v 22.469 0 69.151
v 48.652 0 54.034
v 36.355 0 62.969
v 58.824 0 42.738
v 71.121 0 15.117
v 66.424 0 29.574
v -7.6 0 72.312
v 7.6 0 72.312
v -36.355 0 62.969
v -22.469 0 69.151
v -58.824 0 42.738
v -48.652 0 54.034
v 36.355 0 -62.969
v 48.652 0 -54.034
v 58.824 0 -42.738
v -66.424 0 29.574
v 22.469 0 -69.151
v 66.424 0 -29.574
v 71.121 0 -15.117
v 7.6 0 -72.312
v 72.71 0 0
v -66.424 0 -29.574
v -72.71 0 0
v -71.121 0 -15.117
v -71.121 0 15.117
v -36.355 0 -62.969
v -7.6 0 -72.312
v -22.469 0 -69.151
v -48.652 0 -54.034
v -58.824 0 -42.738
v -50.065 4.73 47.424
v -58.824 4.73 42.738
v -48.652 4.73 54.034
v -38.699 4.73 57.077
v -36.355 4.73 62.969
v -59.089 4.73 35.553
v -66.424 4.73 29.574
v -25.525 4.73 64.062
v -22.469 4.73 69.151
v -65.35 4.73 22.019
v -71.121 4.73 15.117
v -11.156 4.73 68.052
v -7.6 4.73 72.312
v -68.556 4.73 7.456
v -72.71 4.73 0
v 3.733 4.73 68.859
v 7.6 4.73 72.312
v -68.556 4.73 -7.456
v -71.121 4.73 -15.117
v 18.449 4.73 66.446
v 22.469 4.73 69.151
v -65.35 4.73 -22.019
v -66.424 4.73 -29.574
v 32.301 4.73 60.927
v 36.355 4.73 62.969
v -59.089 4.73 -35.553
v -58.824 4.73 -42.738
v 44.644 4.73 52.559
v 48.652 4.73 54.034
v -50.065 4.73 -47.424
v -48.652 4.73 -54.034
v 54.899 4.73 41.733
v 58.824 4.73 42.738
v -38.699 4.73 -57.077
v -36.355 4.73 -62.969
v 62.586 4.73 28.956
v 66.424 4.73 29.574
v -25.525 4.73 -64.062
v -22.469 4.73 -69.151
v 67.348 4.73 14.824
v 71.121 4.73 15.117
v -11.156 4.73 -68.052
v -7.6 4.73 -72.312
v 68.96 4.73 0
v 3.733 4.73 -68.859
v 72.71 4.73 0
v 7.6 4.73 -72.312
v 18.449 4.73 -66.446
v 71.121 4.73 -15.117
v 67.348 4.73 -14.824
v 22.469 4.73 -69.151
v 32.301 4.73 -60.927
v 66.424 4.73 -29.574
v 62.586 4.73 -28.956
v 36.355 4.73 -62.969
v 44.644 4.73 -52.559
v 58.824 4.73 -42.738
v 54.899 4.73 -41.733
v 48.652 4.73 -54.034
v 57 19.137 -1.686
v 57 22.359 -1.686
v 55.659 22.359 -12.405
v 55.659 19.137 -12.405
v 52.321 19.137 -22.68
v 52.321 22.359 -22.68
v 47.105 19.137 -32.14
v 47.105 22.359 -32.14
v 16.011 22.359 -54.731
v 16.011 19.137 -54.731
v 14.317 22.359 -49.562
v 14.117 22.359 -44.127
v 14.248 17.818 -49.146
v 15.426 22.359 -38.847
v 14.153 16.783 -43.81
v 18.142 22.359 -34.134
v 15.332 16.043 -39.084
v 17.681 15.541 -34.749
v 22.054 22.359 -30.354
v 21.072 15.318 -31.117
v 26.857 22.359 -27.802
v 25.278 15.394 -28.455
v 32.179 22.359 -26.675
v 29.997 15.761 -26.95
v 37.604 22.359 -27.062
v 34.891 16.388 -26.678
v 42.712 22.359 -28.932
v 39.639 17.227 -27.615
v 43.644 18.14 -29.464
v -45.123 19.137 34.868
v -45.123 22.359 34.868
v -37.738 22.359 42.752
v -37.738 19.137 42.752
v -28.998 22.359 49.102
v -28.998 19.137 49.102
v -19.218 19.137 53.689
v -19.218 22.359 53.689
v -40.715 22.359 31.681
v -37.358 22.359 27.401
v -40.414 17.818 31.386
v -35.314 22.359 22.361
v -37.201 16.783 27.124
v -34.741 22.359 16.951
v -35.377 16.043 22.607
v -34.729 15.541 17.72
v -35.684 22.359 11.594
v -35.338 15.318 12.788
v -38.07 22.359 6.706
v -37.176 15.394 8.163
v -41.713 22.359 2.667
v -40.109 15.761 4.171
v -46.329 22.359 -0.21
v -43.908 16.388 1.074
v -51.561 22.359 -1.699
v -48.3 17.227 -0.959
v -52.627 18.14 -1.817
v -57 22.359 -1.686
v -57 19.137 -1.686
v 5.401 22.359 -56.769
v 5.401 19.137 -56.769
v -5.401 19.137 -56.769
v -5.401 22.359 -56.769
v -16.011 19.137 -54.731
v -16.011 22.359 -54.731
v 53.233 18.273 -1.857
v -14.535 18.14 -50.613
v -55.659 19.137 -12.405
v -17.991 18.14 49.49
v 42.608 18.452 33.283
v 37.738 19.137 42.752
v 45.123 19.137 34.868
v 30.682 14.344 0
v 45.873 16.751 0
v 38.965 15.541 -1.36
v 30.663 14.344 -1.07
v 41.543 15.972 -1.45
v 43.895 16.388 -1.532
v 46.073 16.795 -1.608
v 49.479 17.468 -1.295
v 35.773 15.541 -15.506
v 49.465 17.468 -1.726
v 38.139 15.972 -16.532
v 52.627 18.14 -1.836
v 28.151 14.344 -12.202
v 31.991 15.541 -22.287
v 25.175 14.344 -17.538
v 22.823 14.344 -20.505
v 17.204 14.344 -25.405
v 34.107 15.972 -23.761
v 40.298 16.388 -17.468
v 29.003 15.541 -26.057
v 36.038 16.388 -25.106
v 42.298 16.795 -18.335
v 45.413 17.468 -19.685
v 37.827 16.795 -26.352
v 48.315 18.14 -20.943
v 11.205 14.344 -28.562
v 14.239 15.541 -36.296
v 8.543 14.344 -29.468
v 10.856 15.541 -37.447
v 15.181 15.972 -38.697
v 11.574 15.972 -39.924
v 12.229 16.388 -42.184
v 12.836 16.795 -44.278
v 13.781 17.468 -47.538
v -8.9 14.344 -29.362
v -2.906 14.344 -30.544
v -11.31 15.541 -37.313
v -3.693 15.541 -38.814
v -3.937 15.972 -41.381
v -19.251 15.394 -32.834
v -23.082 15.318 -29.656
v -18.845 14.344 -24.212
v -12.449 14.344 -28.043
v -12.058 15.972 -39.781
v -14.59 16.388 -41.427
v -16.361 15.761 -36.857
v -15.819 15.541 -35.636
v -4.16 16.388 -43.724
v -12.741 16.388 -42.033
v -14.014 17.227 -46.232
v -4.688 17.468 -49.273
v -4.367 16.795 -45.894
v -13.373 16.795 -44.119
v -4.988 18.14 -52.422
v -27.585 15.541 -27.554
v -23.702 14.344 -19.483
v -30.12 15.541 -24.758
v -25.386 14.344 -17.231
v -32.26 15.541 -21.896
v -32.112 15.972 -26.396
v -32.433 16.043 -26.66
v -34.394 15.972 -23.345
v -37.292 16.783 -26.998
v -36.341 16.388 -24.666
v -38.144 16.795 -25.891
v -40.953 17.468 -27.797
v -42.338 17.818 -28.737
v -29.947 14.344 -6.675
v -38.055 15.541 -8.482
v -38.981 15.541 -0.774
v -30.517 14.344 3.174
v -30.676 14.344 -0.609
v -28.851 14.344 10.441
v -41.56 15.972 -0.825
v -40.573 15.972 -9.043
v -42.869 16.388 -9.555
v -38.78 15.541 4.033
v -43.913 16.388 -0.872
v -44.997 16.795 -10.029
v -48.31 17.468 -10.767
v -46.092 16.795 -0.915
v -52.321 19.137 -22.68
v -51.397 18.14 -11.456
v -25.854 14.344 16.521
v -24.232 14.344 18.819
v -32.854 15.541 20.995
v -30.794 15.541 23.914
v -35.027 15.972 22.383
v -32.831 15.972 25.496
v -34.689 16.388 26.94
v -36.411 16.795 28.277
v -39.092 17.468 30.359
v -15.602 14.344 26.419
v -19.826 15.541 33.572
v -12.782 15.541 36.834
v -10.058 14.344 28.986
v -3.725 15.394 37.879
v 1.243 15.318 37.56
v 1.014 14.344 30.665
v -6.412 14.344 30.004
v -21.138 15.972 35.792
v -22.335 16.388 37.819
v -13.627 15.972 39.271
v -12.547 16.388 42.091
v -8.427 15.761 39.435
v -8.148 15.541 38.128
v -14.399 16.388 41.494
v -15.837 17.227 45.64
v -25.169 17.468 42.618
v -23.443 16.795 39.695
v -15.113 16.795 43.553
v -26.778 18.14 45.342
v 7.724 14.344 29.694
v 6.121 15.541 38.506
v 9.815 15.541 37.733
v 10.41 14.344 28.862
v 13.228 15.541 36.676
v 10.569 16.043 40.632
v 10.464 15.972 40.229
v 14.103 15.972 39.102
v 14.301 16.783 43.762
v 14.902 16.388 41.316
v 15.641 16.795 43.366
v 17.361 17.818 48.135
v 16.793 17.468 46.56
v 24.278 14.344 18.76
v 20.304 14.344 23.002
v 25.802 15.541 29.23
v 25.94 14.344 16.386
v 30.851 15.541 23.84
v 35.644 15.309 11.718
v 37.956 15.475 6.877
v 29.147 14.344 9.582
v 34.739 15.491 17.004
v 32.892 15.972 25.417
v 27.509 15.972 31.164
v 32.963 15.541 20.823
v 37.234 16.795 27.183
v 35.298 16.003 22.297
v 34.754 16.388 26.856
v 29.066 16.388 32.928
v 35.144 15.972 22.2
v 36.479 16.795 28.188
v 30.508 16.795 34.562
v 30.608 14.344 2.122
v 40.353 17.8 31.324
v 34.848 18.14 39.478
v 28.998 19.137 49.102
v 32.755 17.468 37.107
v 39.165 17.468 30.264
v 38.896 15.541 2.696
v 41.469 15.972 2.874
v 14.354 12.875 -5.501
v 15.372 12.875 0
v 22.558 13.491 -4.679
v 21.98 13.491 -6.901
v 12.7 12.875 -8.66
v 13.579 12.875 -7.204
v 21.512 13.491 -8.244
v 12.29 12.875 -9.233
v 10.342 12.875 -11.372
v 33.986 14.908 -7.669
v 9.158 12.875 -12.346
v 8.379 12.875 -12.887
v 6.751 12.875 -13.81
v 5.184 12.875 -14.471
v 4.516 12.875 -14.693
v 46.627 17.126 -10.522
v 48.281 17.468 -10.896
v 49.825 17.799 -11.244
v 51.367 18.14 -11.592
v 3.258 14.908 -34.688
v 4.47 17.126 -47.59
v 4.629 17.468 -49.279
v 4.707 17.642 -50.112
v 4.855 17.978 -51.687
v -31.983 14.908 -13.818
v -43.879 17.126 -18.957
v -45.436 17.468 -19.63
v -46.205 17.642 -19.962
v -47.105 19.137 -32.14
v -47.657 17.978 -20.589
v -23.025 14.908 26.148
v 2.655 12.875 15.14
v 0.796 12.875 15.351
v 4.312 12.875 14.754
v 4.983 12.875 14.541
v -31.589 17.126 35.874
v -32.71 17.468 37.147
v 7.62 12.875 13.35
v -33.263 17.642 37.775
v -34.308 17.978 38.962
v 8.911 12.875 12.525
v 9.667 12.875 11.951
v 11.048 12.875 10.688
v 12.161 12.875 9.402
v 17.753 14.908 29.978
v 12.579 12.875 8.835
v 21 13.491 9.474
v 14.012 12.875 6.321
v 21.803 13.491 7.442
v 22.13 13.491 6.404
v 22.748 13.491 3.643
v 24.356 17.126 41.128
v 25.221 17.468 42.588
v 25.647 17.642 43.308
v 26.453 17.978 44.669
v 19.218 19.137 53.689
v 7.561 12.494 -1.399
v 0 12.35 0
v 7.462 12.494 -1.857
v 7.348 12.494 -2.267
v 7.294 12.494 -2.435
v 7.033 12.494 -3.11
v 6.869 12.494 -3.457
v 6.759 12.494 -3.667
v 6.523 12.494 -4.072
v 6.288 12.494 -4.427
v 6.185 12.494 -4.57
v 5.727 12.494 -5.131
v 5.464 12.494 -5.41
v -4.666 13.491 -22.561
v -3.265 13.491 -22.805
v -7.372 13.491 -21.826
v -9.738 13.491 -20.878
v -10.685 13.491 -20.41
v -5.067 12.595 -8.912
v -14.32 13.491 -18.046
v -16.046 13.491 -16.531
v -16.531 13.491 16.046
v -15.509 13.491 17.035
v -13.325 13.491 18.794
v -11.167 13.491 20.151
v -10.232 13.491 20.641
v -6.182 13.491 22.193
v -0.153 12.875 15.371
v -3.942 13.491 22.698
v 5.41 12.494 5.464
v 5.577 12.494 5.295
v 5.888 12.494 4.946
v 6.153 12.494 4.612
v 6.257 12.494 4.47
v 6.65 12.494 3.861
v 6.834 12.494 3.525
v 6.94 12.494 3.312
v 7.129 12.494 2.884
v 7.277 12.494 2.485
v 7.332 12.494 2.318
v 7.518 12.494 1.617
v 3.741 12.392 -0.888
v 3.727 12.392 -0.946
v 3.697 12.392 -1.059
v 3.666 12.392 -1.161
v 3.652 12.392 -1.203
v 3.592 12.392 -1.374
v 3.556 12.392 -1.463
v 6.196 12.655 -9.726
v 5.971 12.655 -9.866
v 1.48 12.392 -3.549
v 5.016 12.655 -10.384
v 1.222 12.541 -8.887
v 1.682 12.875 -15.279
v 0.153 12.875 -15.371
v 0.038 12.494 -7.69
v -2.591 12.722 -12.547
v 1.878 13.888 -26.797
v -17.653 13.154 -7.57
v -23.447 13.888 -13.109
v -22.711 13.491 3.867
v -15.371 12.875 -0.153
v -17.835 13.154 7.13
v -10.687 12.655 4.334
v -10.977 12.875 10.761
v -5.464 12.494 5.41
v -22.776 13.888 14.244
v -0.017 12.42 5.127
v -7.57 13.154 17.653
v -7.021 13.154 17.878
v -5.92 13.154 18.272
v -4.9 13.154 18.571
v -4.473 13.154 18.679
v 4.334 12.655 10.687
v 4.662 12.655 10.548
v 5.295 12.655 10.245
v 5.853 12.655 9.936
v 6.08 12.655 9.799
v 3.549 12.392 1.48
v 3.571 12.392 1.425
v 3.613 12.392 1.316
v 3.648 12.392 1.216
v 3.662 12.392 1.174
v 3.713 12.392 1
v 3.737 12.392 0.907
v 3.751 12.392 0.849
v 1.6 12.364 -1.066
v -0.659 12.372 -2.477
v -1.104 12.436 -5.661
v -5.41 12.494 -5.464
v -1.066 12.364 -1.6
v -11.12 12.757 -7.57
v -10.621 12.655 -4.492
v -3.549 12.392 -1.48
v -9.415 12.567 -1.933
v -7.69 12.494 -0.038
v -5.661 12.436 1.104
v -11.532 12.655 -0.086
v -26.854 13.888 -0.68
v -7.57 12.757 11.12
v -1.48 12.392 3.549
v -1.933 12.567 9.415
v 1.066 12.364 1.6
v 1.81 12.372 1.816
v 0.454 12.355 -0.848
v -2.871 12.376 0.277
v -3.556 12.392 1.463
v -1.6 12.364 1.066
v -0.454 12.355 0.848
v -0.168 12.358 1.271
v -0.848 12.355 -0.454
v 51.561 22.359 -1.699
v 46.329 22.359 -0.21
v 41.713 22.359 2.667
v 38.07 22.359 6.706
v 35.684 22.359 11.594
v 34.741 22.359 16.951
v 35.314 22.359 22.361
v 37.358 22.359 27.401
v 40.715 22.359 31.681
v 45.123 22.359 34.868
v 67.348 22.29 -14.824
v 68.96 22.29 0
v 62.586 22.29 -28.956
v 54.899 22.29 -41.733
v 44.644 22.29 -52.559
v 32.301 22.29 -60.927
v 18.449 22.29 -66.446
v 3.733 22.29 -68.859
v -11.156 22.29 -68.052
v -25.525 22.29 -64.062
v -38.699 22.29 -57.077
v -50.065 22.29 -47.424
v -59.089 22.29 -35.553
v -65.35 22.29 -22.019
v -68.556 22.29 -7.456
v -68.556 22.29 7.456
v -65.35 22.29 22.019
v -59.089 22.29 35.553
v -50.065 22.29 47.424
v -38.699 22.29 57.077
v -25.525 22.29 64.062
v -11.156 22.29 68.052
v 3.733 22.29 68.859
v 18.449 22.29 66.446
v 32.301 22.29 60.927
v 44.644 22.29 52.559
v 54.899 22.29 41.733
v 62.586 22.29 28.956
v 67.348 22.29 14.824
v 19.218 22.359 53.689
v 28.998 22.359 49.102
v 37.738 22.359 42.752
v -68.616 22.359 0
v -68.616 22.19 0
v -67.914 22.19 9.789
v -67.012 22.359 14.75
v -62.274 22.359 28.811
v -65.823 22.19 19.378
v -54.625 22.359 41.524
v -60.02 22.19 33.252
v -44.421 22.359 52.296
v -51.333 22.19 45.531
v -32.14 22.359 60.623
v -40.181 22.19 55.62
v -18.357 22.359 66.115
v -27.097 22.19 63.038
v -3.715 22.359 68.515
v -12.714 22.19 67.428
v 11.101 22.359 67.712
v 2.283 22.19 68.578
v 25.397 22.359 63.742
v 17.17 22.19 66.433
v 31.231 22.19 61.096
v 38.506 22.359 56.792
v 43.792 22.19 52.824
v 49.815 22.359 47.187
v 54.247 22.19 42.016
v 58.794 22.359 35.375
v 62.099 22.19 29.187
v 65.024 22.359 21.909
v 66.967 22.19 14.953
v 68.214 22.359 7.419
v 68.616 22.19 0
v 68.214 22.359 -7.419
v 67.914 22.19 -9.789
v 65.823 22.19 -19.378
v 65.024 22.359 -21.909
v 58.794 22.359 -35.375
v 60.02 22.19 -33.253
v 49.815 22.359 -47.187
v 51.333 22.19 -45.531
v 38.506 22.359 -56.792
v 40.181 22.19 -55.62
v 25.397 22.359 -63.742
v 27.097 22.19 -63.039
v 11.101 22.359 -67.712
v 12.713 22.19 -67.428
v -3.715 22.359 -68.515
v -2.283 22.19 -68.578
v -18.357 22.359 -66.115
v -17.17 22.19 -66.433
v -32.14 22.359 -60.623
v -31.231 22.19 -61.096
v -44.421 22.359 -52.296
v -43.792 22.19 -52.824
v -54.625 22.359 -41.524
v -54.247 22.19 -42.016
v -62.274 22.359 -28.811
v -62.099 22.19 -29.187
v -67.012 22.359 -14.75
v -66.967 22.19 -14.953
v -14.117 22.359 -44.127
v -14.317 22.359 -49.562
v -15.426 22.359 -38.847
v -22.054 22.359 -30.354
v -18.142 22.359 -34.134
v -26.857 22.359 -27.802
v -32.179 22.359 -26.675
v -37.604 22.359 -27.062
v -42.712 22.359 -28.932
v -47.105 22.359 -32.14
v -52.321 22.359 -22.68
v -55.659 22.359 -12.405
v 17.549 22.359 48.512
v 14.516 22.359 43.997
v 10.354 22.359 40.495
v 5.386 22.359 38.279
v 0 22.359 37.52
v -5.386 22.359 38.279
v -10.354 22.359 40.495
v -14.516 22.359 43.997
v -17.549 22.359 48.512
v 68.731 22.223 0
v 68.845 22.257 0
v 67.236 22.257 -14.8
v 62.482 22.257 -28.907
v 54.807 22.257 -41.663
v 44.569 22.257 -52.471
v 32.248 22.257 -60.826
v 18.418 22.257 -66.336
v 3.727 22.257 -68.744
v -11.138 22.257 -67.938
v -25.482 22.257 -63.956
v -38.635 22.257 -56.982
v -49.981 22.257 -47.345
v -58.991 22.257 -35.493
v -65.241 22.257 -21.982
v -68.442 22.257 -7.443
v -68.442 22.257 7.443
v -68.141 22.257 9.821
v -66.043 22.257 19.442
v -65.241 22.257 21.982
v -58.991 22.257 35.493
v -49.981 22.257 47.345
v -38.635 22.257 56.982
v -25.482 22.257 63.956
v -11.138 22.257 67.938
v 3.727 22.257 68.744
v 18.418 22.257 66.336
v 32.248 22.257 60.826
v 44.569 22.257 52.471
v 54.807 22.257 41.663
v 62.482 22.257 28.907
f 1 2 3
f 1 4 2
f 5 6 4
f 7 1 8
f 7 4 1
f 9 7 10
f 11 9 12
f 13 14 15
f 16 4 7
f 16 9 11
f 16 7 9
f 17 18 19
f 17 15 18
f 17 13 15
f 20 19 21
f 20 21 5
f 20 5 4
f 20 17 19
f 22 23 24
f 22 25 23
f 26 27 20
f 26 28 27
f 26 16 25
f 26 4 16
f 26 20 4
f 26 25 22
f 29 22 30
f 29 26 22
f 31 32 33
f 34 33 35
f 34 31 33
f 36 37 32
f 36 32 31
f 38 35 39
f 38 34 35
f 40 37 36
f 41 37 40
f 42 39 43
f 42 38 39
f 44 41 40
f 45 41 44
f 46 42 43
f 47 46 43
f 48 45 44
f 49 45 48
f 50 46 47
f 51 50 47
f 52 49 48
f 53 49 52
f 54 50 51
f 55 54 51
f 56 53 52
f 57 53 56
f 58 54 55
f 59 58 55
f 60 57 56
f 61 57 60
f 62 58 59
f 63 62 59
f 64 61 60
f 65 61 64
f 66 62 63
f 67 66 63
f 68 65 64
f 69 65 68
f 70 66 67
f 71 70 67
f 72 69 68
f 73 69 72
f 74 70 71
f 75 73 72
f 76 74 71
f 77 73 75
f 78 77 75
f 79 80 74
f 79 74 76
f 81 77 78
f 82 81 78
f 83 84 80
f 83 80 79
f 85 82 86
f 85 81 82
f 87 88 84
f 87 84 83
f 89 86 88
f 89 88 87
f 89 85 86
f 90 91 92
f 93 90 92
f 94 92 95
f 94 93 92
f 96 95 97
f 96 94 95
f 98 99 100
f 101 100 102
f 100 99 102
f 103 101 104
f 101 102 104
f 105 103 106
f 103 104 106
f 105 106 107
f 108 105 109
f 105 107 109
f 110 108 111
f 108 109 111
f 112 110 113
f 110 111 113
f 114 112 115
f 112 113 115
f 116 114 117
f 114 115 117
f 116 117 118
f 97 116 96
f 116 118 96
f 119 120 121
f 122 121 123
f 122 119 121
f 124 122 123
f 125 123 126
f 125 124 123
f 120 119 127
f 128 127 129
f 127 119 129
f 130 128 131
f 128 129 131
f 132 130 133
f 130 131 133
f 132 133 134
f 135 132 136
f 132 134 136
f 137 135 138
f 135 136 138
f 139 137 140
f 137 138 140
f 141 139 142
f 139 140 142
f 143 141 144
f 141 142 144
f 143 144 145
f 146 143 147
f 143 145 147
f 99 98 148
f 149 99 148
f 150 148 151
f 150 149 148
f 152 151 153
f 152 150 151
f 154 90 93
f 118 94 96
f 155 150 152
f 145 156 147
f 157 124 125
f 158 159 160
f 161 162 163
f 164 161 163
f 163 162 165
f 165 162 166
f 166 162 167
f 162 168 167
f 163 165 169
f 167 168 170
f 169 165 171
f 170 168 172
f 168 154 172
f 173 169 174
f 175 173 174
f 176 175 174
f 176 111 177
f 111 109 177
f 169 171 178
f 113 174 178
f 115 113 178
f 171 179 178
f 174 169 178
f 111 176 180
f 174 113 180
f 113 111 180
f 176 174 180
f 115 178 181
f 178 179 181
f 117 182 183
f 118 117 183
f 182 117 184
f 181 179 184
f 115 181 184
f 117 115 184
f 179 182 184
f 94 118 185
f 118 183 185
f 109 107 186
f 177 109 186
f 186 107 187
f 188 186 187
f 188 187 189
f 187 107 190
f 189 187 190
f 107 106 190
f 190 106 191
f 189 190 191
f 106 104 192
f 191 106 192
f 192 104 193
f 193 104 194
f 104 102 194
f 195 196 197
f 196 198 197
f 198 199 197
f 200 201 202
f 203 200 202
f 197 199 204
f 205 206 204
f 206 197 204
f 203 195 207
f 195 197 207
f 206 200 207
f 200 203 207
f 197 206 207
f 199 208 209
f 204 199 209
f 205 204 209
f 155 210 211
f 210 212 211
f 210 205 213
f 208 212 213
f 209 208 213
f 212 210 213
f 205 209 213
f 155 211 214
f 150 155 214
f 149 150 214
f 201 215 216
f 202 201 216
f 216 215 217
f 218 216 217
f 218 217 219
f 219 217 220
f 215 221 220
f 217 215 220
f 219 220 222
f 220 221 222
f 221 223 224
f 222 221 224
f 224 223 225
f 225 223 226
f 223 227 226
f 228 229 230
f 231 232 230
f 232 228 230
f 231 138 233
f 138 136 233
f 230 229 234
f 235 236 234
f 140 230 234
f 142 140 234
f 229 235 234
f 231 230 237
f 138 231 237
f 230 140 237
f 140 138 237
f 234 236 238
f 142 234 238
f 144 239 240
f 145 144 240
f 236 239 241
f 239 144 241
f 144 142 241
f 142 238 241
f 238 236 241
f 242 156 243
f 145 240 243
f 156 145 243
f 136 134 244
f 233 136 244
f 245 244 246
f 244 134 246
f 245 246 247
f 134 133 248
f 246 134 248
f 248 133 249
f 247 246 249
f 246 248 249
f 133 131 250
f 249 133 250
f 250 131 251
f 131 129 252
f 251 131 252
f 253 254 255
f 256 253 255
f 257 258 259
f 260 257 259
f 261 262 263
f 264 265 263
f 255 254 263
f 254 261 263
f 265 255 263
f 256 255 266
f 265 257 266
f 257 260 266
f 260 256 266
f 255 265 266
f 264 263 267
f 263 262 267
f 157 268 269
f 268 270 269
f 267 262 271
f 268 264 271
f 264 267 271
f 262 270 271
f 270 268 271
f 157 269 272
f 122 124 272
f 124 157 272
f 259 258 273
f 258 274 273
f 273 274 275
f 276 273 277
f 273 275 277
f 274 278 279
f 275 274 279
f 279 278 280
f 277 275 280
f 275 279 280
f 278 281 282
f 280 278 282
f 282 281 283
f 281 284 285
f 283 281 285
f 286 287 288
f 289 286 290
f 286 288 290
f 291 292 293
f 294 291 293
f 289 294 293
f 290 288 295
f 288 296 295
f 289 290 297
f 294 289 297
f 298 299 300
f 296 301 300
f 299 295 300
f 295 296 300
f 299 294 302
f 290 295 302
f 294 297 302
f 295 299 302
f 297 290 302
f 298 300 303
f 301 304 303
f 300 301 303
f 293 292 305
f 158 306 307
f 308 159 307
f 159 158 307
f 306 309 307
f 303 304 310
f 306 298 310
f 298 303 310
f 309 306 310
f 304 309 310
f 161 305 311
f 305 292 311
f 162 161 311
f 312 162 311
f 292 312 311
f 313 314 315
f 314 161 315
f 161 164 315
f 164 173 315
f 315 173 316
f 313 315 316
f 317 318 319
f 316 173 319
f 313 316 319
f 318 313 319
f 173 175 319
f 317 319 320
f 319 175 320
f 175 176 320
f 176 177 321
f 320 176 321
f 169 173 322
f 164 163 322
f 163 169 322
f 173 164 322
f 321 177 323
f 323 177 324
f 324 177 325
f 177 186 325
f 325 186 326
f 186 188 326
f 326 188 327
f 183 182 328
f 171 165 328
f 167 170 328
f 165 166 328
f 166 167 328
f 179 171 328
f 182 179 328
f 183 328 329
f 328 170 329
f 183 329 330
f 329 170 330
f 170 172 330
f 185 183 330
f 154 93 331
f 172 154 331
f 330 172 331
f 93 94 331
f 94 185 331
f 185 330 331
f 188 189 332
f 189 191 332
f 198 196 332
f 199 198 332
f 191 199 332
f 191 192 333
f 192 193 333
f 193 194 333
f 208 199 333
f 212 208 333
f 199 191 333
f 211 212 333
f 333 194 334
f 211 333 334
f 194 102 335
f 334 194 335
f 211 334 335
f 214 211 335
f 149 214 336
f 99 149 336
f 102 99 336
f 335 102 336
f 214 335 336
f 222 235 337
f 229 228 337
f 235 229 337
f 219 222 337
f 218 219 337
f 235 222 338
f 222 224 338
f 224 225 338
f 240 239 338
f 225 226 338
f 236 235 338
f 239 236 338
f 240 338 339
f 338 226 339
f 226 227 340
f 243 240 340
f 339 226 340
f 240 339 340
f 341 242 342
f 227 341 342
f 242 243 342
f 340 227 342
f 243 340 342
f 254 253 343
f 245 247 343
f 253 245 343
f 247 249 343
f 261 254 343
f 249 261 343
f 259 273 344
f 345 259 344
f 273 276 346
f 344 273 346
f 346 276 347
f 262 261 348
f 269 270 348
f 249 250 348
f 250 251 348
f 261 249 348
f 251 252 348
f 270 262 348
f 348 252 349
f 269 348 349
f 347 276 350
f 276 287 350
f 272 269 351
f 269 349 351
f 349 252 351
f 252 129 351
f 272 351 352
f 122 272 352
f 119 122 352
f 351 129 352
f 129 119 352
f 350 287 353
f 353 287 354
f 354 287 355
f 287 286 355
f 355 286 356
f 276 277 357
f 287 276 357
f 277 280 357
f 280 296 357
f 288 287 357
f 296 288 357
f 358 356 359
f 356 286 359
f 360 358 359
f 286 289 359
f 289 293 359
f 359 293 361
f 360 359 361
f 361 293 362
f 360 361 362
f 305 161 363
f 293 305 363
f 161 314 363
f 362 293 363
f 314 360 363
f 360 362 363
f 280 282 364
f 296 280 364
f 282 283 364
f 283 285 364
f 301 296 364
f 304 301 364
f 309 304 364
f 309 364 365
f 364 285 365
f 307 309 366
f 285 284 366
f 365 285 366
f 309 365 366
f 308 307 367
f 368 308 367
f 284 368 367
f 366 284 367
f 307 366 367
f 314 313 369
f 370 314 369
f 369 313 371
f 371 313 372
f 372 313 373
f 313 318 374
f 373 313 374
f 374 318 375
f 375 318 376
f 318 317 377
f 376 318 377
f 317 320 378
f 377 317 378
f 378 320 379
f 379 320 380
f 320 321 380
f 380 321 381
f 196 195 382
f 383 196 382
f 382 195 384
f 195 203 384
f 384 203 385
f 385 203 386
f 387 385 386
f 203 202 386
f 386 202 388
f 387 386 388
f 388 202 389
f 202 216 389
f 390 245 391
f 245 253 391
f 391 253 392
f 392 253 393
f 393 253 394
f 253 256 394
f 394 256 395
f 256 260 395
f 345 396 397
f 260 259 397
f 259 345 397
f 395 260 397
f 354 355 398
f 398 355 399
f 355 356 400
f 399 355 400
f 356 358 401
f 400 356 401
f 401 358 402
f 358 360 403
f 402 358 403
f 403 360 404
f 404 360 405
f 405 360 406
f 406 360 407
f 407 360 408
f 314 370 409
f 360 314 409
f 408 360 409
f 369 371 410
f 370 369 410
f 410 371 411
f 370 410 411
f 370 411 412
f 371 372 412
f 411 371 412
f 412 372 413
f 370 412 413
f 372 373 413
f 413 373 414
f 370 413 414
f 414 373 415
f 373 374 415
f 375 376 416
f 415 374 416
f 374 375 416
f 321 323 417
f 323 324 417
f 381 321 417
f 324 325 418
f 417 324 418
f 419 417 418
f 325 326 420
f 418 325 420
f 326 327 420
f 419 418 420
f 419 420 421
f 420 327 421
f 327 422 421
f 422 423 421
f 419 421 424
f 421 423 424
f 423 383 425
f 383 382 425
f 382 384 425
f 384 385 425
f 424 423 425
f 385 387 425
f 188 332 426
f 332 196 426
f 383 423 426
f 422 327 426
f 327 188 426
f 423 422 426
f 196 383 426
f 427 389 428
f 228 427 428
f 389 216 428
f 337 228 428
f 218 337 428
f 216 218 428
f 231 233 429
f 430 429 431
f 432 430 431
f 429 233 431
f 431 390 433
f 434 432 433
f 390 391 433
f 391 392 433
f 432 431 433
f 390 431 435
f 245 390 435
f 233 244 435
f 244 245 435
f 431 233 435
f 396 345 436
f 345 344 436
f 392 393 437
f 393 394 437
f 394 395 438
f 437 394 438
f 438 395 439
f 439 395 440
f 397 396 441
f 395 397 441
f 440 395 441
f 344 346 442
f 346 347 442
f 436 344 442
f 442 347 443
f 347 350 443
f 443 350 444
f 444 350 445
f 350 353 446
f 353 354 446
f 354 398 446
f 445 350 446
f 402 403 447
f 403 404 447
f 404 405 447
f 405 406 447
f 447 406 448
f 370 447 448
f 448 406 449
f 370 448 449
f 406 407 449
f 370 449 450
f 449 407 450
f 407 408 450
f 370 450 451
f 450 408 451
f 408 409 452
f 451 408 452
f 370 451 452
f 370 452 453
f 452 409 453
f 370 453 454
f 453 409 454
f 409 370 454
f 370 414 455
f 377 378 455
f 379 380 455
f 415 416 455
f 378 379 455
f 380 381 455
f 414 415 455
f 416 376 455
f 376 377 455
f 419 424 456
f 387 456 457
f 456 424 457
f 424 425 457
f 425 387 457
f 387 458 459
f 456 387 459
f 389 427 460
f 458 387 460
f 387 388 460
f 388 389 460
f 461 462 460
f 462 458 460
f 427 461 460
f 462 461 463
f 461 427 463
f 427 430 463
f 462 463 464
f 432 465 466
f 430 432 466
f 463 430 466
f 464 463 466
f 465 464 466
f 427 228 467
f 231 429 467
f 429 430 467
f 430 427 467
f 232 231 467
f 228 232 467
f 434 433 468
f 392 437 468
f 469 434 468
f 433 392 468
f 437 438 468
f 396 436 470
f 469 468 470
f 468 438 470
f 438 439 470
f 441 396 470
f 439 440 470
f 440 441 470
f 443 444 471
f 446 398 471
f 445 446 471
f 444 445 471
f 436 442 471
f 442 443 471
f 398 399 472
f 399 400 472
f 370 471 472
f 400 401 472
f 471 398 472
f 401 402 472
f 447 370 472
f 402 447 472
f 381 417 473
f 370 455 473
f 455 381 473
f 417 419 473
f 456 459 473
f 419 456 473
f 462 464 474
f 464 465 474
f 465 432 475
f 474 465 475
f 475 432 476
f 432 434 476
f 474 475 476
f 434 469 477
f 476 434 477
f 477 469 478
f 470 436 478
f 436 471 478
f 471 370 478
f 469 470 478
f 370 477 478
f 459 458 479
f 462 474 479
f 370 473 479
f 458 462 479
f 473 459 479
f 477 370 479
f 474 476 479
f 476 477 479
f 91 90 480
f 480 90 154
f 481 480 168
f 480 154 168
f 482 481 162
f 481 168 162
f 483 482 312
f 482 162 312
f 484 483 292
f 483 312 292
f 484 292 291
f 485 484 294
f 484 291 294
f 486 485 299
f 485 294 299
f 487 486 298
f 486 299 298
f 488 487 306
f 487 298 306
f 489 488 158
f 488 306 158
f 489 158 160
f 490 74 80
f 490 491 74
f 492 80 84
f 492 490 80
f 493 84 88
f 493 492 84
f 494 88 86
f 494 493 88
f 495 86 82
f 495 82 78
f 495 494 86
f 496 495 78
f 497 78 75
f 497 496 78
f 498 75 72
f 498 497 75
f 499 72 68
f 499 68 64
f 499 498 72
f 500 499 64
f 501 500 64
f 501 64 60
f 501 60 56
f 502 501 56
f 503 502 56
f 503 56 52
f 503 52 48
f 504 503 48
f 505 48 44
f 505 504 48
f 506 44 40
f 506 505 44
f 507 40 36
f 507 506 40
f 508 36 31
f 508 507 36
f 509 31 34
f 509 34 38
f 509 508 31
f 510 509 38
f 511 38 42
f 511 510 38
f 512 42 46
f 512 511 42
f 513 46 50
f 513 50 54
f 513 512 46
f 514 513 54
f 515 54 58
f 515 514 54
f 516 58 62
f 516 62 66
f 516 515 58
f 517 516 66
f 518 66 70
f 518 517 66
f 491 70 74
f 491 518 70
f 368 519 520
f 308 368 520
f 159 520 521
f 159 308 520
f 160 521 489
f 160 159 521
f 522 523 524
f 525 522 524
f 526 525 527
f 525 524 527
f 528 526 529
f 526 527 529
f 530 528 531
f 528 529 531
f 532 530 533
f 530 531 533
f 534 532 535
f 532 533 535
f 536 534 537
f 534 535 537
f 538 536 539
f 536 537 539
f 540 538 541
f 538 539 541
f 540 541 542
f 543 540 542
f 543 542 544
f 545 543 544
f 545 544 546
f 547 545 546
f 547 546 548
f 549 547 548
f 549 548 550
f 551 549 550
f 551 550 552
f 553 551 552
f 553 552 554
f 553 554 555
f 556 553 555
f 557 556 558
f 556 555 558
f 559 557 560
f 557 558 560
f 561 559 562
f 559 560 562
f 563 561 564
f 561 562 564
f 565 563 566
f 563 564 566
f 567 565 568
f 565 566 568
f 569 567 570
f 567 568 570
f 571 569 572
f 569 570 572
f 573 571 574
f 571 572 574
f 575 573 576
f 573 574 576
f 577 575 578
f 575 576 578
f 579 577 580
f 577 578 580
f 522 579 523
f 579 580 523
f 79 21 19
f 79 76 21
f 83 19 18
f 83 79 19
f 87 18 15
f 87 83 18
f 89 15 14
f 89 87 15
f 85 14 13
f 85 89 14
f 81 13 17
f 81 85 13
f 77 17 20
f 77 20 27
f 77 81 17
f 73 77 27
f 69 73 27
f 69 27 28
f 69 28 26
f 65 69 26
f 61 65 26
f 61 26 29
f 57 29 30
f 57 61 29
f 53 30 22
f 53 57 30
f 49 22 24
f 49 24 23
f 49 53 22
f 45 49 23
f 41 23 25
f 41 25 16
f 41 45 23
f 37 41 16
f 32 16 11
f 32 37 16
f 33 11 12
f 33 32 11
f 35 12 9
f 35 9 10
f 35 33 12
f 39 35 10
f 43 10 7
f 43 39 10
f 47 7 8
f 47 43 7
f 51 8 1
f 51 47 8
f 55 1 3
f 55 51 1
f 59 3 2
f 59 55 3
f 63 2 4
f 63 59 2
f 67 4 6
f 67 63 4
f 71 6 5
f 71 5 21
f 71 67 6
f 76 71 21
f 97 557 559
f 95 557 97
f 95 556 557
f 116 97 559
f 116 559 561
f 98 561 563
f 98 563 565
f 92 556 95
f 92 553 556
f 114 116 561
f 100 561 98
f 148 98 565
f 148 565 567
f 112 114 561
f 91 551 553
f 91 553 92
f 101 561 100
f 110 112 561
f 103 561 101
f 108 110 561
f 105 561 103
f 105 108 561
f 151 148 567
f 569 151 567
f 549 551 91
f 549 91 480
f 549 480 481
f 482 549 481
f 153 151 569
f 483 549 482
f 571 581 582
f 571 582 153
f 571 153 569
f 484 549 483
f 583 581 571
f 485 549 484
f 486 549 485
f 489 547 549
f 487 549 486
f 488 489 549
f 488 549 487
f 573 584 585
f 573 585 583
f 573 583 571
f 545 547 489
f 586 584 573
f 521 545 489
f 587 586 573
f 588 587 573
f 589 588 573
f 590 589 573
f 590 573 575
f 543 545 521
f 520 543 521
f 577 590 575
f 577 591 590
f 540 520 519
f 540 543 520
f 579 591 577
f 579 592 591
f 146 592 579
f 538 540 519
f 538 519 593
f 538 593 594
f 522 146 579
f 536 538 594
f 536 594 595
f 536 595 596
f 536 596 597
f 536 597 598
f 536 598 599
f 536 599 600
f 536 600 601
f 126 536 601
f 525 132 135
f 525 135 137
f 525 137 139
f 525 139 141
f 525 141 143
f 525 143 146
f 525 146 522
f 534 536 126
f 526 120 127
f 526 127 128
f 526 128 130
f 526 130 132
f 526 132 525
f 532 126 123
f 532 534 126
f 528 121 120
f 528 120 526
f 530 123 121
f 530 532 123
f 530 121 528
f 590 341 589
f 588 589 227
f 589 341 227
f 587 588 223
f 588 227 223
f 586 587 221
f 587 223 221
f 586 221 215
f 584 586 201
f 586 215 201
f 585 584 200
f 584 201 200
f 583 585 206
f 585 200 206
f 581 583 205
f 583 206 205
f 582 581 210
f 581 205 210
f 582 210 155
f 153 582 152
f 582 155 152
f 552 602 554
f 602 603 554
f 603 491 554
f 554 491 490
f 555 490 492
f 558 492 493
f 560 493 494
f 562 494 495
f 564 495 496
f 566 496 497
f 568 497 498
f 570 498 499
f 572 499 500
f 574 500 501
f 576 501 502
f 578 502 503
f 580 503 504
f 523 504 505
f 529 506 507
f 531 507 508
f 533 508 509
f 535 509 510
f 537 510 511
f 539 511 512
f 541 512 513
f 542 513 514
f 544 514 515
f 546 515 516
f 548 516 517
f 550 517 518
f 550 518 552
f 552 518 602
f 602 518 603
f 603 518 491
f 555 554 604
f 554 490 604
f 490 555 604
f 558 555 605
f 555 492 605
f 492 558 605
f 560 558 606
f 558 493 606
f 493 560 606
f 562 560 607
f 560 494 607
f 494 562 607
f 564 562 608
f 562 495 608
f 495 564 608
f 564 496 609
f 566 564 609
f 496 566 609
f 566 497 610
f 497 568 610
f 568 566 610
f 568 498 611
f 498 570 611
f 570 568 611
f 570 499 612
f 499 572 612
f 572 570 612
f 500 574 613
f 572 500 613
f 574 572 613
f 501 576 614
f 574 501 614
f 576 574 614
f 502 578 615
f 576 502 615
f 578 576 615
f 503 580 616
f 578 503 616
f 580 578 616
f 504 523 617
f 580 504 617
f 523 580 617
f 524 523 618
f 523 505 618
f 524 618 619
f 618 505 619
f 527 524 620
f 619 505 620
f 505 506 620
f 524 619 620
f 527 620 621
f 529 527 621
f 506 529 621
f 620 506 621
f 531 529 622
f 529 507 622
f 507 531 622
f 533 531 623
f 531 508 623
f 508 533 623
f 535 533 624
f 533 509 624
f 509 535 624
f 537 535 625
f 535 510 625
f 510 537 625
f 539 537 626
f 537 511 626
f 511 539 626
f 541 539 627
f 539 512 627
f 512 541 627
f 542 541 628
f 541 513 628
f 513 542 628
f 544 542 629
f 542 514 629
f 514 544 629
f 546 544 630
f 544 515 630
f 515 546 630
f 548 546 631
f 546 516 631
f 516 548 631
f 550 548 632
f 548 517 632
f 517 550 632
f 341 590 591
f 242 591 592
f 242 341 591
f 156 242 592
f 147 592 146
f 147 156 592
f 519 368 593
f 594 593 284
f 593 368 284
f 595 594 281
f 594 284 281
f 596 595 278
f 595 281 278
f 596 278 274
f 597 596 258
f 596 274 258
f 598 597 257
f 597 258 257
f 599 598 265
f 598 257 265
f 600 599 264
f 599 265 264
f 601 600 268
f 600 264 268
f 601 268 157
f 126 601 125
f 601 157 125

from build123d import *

# Parameters (mm, degrees)
SKETCH001_R = 68.61574
PAD_DEPTH   = 18


with BuildPart() as part:
    # Sketch → Revolution (revolve)
    with BuildSketch(Plane.XY):
        with BuildLine():
            Line((0, 0), (68.71, 0))
            Line((68.71, 0), (72.71, 0))
            Line((72.71, 0), (72.71, 4.73))
            Line((72.71, 4.73), (68.96, 4.73))
            Line((68.96, 4.73), (68.96, 22.29))
            ThreePointArc((0, 12.35), (34.827971, 14.905909), (68.96, 22.29))
            Line((0, 12.35), (0, 0))
        make_face()
    revolve(axis=Axis((0, 0, 0), (0, 1, 0)))

    # Sketch001 (on DatumPlane) → Pad (new body)
    with BuildSketch(Plane(origin=(0, 4.358878, 0), x_dir=(-1, 0, 0), z_dir=(0, 1, 0))):
        Circle(SKETCH001_R)
        with BuildLine():
            ThreePointArc((45.123091, 34.867908), (33.518525, 46.134291), (19.217549, 53.689385))
            ThreePointArc((-19.217549, 53.689385), (0, 37.520215), (19.217549, 53.689385))
            ThreePointArc((-19.217549, 53.689385), (-33.518525, 46.134291), (-45.123091, 34.867908))
            ThreePointArc((-57.000189, -1.686043), (-35.683845, 11.594384), (-45.123091, 34.867908))
            ThreePointArc((-57.000189, -1.686043), (-54.234112, -17.621731), (-47.105153, -32.139833))
            ThreePointArc((-16.010505, -54.731417), (-22.053829, -30.354491), (-47.105153, -32.139833))
            ThreePointArc((-16.010505, -54.731417), (0, -57.02512), (16.010505, -54.731417))
            ThreePointArc((47.105153, -32.139833), (22.053829, -30.354491), (16.010505, -54.731417))
            ThreePointArc((47.105153, -32.139833), (54.234112, -17.621731), (57.000189, -1.686043))
            ThreePointArc((45.123091, 34.867908), (35.683845, 11.594384), (57.000189, -1.686043))
        make_face(mode=Mode.SUBTRACT)
    extrude(amount=PAD_DEPTH)


solid = part.part
